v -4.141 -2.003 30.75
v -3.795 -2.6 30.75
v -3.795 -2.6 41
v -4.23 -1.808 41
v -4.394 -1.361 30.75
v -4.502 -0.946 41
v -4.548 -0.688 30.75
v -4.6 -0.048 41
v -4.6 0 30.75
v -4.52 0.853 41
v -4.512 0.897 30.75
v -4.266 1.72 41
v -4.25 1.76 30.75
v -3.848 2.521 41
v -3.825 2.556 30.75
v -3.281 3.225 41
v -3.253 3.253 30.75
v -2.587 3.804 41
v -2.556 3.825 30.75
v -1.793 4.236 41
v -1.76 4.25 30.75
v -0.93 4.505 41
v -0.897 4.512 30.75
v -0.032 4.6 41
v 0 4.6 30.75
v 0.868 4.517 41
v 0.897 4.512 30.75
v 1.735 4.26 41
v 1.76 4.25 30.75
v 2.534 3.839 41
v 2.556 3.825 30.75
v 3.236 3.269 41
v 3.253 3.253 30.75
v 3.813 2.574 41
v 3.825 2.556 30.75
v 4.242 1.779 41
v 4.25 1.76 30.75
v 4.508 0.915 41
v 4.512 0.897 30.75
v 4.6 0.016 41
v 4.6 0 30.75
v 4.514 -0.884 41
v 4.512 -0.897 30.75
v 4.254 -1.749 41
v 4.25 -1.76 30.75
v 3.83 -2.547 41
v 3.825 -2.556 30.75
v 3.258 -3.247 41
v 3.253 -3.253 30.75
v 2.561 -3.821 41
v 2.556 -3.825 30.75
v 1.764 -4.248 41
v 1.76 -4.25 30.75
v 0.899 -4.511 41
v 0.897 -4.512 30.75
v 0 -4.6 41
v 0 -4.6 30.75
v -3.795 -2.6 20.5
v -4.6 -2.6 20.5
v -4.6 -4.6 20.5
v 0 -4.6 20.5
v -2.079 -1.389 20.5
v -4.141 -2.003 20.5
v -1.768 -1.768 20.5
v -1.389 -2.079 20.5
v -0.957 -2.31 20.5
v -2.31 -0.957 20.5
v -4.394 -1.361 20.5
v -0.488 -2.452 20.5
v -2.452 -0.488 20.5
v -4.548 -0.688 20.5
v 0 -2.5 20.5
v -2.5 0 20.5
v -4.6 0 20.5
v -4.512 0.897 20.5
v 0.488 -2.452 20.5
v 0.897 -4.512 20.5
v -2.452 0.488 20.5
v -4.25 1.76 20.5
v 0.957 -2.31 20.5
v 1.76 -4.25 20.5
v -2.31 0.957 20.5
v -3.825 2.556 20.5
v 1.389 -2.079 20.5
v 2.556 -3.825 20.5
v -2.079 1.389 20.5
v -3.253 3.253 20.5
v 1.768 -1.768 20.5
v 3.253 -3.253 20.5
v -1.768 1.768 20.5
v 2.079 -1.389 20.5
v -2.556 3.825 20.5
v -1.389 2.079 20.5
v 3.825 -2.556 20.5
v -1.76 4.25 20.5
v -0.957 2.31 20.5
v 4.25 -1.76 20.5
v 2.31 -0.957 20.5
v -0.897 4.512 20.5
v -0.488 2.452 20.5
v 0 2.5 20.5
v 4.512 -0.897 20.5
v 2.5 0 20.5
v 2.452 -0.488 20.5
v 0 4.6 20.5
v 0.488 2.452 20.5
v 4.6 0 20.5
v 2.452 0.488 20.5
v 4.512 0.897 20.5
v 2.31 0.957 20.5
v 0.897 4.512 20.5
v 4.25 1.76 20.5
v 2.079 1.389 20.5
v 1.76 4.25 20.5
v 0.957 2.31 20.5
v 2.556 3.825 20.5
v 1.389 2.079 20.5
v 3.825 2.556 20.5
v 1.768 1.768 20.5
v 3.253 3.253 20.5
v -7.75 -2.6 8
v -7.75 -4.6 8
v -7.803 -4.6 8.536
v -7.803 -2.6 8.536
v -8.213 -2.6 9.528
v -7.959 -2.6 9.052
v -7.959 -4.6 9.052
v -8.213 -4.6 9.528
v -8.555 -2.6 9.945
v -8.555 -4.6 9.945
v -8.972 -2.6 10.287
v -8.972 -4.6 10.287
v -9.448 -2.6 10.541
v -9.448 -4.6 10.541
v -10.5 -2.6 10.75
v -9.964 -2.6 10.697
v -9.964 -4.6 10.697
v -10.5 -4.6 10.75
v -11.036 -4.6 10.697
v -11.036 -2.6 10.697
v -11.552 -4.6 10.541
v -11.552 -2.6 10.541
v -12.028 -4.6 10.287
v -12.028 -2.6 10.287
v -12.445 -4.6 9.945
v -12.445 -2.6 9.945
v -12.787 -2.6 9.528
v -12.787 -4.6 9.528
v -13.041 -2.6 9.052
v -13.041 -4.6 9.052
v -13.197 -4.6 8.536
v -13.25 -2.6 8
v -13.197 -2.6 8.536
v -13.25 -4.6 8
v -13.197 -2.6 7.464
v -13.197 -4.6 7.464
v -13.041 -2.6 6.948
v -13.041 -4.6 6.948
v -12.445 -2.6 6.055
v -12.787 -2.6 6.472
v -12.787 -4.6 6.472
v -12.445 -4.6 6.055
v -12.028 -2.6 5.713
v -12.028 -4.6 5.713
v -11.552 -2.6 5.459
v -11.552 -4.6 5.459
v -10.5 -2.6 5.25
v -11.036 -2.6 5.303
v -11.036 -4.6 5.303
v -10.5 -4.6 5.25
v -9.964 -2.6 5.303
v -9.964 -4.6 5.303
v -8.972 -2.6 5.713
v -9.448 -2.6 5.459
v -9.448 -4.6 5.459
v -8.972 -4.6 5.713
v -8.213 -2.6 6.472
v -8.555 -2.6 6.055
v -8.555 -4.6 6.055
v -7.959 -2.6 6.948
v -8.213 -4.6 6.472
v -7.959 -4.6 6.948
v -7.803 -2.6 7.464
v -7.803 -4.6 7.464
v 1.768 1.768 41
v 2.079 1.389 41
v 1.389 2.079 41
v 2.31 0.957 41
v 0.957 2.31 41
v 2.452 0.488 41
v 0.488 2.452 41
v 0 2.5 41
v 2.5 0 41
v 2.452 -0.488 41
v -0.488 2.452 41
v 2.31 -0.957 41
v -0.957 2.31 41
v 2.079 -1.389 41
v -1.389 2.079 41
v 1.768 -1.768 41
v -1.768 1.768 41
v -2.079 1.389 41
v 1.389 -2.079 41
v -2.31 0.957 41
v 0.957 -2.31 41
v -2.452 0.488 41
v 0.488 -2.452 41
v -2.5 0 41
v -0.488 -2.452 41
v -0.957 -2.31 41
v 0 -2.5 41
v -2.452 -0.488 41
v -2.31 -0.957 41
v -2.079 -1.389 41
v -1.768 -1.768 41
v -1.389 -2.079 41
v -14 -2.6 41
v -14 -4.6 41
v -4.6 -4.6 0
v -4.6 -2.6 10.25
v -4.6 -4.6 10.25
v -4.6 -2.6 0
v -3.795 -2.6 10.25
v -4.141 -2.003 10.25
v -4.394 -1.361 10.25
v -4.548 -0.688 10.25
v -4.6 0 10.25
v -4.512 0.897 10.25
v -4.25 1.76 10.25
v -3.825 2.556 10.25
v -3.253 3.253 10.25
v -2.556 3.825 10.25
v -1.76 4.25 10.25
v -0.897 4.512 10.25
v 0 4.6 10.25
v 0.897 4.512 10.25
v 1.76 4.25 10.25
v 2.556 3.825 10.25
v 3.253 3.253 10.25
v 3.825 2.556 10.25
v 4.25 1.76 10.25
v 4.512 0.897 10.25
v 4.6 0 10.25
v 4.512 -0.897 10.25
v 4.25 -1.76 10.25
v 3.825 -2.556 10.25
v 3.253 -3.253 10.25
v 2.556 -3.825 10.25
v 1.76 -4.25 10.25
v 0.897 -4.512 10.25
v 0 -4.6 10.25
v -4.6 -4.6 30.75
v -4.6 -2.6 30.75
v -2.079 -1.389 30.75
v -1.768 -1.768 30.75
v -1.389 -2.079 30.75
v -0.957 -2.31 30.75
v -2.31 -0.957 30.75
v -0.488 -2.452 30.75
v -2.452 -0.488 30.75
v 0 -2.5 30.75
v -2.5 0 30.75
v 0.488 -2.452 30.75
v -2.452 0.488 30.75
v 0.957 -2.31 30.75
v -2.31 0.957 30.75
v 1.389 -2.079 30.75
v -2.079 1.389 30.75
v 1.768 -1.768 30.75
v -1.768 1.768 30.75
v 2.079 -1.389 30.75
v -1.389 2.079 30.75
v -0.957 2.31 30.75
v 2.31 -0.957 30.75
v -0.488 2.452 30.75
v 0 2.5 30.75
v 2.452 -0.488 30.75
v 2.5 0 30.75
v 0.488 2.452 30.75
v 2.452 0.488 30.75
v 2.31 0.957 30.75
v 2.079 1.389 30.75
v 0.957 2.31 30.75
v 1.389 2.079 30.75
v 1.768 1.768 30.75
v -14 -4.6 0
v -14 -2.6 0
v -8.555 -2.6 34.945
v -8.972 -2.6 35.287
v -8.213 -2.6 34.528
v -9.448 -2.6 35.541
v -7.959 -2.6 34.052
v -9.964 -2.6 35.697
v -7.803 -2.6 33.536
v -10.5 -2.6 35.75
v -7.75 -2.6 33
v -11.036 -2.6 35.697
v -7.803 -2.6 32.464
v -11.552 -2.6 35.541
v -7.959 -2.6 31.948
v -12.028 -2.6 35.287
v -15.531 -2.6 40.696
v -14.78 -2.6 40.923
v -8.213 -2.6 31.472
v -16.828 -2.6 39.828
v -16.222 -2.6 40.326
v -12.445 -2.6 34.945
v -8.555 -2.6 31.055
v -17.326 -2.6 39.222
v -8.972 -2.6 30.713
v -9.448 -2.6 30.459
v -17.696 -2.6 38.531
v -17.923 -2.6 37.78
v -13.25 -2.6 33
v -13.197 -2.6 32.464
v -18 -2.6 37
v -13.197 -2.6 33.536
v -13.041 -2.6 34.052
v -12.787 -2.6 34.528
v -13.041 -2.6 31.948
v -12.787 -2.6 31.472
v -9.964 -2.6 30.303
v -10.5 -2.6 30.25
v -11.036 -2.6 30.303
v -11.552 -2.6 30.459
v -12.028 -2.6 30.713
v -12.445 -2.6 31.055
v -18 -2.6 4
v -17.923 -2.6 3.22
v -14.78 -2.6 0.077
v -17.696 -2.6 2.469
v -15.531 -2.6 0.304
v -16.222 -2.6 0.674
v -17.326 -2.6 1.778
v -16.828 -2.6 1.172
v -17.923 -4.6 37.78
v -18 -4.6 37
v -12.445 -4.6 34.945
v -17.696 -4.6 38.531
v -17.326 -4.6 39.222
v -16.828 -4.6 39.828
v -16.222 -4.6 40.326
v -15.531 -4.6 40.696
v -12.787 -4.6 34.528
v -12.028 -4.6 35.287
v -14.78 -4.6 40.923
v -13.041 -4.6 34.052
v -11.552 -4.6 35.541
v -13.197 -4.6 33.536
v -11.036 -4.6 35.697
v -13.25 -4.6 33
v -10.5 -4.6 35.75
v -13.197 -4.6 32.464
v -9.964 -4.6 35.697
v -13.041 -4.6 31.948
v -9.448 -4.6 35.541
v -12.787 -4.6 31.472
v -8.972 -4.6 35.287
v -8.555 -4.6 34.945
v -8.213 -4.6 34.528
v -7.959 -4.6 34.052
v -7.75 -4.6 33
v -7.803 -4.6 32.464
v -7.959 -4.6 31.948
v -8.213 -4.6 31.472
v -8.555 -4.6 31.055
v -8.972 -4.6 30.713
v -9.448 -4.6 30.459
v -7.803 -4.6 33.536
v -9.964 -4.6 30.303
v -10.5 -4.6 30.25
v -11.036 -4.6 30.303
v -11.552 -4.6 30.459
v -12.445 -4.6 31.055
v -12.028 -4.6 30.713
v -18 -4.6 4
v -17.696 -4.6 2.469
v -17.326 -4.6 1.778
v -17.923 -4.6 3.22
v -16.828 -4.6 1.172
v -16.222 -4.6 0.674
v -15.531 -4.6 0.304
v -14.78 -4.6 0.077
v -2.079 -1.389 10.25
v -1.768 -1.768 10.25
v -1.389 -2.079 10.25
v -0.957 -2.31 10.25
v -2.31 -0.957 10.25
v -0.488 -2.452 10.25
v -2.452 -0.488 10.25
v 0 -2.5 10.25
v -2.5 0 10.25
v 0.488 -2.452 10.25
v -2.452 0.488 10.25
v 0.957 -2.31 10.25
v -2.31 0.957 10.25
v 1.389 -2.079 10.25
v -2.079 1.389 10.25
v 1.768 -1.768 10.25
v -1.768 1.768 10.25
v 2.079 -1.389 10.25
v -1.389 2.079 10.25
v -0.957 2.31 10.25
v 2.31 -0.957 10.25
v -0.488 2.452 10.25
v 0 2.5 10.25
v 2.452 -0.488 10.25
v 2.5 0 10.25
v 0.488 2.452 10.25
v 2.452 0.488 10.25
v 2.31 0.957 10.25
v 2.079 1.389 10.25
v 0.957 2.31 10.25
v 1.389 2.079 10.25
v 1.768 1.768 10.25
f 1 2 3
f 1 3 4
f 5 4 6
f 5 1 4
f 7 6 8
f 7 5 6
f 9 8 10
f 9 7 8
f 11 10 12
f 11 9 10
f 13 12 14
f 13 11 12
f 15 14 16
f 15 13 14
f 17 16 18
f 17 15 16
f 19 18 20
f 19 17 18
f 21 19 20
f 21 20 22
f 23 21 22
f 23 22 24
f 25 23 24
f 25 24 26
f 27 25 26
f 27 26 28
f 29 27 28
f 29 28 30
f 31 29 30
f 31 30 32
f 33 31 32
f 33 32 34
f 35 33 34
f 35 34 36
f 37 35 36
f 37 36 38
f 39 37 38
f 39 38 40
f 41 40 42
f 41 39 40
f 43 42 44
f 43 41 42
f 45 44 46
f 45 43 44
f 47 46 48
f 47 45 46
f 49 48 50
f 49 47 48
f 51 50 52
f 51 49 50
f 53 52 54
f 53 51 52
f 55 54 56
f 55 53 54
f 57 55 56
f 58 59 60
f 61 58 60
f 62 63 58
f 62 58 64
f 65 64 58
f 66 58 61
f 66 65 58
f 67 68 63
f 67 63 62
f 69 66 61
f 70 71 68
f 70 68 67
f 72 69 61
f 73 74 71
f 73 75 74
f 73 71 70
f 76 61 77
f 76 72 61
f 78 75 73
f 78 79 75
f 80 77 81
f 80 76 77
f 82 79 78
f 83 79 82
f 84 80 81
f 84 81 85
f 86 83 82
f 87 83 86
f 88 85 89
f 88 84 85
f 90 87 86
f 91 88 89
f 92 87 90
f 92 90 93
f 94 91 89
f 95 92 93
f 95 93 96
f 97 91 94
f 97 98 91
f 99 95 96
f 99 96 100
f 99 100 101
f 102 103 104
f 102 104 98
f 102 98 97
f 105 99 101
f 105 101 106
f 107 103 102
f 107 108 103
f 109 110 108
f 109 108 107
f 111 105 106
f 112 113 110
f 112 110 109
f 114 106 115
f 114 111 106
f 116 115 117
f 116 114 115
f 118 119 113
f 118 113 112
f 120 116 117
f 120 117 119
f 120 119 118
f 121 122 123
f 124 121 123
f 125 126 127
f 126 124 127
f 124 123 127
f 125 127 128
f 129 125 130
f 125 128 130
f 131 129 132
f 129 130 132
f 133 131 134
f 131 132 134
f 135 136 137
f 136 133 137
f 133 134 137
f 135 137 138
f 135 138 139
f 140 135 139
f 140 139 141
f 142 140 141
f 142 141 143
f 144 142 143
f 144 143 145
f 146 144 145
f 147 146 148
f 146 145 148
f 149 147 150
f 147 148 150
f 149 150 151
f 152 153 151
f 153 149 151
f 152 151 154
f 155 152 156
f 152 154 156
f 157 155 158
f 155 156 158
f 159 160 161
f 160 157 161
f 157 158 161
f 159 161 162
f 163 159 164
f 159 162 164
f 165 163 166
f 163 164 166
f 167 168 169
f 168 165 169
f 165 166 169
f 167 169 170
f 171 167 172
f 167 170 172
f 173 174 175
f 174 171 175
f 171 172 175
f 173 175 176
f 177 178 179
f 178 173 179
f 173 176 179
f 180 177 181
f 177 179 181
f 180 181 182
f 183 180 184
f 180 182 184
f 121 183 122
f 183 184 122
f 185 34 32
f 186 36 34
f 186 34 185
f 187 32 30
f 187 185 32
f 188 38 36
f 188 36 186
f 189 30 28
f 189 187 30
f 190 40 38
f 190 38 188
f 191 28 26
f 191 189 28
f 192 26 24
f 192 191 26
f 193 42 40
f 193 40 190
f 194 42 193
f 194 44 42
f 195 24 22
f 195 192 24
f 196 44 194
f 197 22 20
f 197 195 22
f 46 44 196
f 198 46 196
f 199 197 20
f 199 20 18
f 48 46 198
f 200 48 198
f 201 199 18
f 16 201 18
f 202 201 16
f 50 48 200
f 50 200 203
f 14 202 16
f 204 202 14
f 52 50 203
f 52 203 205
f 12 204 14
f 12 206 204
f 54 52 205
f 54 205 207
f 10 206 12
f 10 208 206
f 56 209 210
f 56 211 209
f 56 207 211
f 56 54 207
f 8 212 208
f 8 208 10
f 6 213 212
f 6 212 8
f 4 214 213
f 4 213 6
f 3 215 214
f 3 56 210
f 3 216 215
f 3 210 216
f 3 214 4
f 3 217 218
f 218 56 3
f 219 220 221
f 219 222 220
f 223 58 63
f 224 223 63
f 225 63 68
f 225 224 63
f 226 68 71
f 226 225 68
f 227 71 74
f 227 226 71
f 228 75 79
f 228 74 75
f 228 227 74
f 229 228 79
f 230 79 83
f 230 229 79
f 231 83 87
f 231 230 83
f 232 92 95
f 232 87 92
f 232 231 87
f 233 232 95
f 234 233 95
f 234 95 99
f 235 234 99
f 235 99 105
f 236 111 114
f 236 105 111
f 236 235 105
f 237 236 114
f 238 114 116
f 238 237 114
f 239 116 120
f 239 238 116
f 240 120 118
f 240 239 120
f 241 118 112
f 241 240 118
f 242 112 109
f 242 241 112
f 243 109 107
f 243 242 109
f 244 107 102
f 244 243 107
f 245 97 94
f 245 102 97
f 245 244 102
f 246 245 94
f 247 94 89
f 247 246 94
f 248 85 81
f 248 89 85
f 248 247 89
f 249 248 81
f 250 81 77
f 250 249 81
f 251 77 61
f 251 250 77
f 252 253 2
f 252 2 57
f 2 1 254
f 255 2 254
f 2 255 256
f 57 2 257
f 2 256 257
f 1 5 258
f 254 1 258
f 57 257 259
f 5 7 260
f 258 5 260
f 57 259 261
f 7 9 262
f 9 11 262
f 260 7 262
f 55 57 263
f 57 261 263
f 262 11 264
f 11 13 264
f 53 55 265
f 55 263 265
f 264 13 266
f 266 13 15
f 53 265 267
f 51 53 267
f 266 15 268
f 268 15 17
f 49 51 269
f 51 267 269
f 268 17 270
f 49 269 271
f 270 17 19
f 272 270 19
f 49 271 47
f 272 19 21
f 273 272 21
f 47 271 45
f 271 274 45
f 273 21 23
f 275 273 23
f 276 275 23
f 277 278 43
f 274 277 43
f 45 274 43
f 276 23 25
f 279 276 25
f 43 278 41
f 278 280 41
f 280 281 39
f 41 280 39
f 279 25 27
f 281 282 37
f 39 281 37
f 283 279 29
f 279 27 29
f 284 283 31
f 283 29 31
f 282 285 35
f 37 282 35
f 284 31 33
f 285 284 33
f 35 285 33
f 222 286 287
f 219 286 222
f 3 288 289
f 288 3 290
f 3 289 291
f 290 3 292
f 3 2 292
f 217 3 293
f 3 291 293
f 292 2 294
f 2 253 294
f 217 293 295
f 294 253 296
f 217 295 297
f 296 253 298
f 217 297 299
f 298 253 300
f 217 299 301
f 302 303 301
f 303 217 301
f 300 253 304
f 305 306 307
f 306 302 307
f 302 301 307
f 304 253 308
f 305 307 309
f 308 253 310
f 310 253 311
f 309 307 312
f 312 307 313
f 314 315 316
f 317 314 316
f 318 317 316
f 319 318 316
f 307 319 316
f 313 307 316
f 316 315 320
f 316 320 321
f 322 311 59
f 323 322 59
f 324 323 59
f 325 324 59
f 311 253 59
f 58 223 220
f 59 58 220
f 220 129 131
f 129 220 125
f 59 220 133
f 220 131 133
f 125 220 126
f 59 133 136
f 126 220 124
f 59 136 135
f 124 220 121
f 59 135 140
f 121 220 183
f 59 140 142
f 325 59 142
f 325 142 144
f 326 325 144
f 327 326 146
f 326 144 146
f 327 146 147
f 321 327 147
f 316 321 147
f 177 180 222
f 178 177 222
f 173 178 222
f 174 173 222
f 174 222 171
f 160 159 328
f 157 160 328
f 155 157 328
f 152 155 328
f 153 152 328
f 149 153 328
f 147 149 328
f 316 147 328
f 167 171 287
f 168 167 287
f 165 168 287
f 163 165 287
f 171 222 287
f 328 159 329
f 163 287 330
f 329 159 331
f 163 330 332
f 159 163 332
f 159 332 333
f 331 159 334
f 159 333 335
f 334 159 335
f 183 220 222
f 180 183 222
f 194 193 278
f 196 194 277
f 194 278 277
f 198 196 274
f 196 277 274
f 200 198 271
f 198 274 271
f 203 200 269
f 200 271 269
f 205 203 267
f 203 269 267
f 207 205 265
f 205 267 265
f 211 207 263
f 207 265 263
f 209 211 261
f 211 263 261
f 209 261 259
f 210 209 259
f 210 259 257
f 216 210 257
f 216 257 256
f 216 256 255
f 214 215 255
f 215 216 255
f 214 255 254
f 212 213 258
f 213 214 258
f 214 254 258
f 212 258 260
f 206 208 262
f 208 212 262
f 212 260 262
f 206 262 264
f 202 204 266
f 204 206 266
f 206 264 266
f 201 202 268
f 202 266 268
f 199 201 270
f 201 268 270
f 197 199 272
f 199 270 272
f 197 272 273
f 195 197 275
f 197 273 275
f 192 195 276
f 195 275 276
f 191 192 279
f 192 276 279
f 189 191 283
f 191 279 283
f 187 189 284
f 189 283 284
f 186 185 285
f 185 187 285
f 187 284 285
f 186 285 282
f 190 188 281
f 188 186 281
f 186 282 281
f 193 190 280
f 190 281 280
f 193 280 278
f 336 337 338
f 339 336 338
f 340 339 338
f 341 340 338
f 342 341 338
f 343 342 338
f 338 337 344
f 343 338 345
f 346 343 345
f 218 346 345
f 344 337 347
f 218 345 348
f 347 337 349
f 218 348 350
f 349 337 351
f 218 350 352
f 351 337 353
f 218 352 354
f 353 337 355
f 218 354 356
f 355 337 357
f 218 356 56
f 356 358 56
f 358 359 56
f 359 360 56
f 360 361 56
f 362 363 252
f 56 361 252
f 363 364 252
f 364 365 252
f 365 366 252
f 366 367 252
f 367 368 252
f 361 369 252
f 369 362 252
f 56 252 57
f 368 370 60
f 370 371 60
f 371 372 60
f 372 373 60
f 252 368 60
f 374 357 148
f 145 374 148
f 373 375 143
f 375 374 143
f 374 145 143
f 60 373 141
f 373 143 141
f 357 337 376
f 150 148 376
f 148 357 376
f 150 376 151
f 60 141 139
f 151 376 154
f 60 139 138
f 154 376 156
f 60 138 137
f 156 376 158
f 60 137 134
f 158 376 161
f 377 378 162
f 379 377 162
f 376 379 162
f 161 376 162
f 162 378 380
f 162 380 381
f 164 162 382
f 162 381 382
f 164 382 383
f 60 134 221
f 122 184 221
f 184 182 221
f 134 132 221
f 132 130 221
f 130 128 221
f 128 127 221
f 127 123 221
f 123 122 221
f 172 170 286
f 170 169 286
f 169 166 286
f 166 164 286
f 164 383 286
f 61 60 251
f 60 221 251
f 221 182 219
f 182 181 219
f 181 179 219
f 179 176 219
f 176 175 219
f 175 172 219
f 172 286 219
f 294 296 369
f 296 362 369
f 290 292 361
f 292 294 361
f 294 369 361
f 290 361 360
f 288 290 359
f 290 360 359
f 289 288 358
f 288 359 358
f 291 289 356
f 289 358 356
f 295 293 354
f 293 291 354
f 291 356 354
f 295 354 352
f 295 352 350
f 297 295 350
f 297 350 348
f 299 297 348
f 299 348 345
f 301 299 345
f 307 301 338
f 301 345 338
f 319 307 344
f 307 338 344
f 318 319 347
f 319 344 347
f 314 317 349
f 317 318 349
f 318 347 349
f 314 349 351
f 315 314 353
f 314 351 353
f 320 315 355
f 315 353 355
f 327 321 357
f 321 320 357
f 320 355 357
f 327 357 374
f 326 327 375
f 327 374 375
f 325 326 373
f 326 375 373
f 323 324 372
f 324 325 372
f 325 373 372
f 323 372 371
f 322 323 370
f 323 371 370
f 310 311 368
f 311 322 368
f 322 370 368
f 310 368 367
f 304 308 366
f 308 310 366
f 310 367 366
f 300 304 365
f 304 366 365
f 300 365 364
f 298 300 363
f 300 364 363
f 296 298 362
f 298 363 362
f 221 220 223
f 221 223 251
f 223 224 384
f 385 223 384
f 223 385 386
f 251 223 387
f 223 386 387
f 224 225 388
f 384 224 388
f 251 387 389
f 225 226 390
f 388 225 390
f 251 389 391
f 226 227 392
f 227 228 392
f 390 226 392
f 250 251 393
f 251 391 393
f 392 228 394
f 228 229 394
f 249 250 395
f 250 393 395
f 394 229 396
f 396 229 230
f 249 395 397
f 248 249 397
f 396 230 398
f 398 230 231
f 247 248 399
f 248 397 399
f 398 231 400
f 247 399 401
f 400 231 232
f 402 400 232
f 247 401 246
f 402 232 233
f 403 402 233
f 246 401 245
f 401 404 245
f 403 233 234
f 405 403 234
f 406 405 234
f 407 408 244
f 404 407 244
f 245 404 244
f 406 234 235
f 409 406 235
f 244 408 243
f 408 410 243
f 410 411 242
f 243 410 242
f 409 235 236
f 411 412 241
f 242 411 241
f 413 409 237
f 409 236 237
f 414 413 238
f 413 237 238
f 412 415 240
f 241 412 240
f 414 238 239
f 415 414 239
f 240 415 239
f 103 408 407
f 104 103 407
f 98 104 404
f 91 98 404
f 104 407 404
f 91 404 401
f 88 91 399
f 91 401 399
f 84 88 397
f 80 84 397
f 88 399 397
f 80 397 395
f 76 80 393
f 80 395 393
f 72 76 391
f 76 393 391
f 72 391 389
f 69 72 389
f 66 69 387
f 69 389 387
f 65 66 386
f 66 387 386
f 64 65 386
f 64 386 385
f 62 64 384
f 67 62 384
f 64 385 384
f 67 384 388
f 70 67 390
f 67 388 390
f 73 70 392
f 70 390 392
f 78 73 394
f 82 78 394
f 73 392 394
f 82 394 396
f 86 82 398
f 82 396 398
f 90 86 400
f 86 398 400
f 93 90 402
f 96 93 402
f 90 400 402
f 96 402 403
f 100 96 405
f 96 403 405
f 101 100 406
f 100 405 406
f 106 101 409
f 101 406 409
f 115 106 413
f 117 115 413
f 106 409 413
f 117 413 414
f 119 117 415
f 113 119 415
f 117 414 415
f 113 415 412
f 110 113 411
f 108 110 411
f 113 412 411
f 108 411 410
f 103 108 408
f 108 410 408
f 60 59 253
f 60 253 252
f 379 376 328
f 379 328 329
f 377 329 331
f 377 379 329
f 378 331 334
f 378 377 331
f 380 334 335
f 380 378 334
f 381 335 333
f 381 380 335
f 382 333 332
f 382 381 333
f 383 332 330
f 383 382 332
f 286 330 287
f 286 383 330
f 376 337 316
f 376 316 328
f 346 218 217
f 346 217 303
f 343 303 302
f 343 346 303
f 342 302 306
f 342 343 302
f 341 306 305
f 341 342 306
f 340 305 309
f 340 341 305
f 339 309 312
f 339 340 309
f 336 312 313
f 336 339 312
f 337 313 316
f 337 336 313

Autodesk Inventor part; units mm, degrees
sketch "Sketch_1" plane through (0, 0, 0) normal (0, 0, 1) x (1, 0, 0)
  line L0 (-18, -4.6) -> (0, -4.6)
  arc A0 (0, -4.6) -> (-3.7947, -2.6) centre (0, 0) ccw
  line L1 (-3.7947, -2.6) -> (-18, -2.6)
  line L2 (-18, -2.6) -> (-18, -4.6)
  circle A1 centre (0, 0) radius 2.5
extrude "Extrusion1" add sketch "Sketch_1" along normal blind 41
sketch "Sketch_2" plane through (0, -4.6, 0) normal (0, 1, 0) x (1, 0, 0)
  line L0 (-20, 2) -> (-20, -43)
  line L1 (-20, -43) -> (-9.2, -43)
  line L2 (-9.2, -43) -> (-9.2, -41)
  line L3 (-9.2, -41) -> (-14, -41)
  arc A0 (-18, -37) -> (-14, -41) centre (-14, -37) ccw
  line L4 (-18, -37) -> (-18, -4)
  arc A1 (-14, 0) -> (-18, -4) centre (-14, -4) ccw
  line L5 (-14, 0) -> (-9.2, 0)
  line L6 (-9.2, 0) -> (-9.2, 2)
  line L7 (-9.2, 2) -> (-20, 2)
extrude "Extrusion2" cut sketch "Sketch_2" along normal blind 2
sketch "Sketch_3" plane through (0, -4.6, 0) normal (0, 1, 0) x (1, 0, 0)
  circle A0 centre (-10.5, -33) radius 2.75
extrude "Extrusion3" cut sketch "Sketch_3" along normal blind 2
sketch "Sketch_4" plane through (0, -4.6, 0) normal (0, 1, 0) x (1, 0, 0)
  circle A0 centre (-10.5, -8) radius 2.75
extrude "Extrusion4" cut sketch "Sketch_4" along normal blind 2
sketch "Sketch_7" plane through (0, 0, 0) normal (0, 0, 1) x (1, 0, 0)
  line L0 (-4.6, -4.6) -> (0, -4.6)
  arc A0 (0, -4.6) -> (-4.6, 0) centre (0, 0) ccw
  line L1 (-4.6, 0) -> (-4.6, -4.6)
extrude "Extrusion5" cut sketch "Sketch_7" along normal blind 10.25
sketch "Sketch_5" plane through (0, 0, 30.75) normal (0, 0, 1) x (1, 0, 0)
  line L0 (-4.6, -4.6) -> (0, -4.6)
  arc A0 (0, -4.6) -> (-4.6, 0) centre (0, 0) ccw
  line L1 (-4.6, 0) -> (-4.6, -4.6)
extrude "Extrusion6" cut sketch "Sketch_5" against normal blind 10.25
ref_plane "3_to_1_XY" through (0, 0, 20.5) normal (0, 0, 1) x (1, 0, 0)
ref_plane "3_to_1_YZ" through (0, 0, 20.5) normal (1, 0, 0) x (0, 1, 0)
ref_plane "3_to_1_ZX" through (0, 0, 20.5) normal (0, 1, 0) x (0, 0, 1)
properties part number "SHPSNA5_3"
